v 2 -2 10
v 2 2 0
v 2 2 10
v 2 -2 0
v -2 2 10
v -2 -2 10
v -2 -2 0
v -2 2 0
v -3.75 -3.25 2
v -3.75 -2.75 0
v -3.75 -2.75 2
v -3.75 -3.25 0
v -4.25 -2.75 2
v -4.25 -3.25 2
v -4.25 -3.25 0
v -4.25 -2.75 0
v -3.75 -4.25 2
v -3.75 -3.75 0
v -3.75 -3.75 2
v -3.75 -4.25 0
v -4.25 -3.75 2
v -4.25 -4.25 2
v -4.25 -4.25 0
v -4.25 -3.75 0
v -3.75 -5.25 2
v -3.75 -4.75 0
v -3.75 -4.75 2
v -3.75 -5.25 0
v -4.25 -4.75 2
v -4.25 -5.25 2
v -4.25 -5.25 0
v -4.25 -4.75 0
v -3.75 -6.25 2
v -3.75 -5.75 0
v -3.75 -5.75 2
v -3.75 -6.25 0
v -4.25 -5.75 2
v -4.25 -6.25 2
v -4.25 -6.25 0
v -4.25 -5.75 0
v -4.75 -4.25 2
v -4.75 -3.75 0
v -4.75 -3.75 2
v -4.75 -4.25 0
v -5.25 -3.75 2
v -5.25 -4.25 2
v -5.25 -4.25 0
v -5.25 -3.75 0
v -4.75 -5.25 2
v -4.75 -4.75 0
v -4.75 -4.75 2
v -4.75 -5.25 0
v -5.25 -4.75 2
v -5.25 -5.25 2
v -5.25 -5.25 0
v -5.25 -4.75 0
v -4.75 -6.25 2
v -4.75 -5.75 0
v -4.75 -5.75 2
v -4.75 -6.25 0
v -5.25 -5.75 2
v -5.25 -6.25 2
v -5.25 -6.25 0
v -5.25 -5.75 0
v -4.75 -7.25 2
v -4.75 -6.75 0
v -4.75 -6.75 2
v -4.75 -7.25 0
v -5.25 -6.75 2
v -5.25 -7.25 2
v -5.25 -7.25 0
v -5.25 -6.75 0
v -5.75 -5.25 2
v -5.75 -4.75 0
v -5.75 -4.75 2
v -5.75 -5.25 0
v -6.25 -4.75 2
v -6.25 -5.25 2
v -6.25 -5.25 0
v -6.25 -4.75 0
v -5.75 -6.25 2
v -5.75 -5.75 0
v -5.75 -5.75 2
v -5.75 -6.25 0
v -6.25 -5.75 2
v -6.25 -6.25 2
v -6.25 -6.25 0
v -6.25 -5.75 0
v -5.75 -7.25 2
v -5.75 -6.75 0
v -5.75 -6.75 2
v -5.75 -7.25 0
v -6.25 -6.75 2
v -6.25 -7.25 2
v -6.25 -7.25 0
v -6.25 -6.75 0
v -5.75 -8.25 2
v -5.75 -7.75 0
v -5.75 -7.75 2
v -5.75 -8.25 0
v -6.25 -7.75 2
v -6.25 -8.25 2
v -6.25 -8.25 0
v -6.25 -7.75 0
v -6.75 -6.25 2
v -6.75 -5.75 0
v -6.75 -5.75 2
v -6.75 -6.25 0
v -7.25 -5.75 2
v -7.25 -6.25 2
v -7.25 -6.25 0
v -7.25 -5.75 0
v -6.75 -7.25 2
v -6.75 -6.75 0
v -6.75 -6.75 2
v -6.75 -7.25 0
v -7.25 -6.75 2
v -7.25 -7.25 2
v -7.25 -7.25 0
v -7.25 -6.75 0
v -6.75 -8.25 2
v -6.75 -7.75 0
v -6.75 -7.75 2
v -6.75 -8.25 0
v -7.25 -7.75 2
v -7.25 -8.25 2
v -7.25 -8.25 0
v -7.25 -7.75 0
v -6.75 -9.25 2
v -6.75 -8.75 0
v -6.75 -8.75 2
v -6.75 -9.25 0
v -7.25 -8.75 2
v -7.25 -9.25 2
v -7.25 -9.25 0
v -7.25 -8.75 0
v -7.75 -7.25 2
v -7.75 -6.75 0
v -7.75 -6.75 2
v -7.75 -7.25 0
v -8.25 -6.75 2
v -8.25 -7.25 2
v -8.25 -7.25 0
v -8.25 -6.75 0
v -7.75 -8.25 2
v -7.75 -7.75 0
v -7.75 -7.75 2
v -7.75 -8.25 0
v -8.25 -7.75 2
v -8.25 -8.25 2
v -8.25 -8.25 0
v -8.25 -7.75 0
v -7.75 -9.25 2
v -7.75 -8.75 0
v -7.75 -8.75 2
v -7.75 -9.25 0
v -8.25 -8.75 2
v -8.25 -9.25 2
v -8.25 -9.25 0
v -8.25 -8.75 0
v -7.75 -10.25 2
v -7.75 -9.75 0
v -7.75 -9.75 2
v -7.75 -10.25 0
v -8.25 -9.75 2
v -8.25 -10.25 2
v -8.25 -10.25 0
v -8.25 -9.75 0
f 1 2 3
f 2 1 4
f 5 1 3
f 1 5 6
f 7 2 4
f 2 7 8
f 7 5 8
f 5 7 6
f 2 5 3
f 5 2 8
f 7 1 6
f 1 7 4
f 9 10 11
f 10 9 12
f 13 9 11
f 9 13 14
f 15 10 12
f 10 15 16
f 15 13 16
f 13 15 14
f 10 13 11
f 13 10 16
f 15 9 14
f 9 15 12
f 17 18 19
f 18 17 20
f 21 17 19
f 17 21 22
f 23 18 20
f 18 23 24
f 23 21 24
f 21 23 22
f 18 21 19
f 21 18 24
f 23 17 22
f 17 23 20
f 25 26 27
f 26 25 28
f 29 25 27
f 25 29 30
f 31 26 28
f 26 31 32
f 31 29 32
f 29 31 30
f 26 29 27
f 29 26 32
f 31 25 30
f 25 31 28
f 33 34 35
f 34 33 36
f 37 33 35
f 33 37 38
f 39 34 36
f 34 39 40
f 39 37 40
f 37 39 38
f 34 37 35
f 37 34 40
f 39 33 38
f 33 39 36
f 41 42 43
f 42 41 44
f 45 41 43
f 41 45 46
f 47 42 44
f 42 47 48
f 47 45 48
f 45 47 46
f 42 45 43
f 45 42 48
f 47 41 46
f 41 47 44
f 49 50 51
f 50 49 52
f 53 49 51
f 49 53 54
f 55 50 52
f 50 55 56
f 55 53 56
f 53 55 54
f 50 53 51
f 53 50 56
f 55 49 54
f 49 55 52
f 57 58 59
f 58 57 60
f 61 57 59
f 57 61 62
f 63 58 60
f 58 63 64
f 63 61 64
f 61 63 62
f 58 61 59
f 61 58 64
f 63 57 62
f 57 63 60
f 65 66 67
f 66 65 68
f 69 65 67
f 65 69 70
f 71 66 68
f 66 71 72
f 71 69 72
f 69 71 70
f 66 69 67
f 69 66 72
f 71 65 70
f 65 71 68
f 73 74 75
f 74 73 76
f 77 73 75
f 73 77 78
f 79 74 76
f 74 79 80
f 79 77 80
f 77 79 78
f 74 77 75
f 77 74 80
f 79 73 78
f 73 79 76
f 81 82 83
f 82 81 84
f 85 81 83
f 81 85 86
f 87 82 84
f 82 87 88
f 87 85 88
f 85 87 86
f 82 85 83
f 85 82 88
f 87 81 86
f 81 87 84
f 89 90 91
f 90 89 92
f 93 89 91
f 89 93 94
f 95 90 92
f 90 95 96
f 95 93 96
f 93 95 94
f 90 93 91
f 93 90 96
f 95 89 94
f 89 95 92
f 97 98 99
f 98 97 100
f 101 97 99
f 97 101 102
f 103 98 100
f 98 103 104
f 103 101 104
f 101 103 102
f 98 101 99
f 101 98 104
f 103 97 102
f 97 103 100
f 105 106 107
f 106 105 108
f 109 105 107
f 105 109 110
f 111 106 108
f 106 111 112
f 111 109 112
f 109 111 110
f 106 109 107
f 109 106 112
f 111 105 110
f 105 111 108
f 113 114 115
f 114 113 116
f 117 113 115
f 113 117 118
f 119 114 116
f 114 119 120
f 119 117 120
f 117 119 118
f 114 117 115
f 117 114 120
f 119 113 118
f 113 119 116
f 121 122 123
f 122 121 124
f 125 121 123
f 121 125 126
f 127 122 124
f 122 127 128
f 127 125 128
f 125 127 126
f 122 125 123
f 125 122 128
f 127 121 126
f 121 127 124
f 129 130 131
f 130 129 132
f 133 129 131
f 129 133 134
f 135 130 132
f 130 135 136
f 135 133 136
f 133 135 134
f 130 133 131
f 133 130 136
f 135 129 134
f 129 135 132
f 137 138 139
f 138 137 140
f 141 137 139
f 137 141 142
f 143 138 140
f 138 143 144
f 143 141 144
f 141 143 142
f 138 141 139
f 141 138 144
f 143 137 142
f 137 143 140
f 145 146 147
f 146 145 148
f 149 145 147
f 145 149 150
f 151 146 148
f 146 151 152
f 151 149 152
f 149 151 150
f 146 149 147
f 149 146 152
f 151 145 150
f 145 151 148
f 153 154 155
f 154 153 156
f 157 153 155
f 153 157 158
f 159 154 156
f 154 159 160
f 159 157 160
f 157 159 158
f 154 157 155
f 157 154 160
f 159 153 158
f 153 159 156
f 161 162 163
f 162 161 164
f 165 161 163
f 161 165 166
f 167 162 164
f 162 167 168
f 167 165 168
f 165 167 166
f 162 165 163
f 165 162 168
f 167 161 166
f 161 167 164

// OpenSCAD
translate([0, 0, 5]) color([0,1,0,0.9]) cube([4, 4, 10], center=true);
translate([-4, -3, 1]) color([1,0,0]) cube([0.5, 0.5, 2], center=true);
translate([-4, -4, 1]) color([1,0,0]) cube([0.5, 0.5, 2], center=true);
translate([-4, -5, 1]) color([1,0,0]) cube([0.5, 0.5, 2], center=true);
translate([-4, -6, 1]) color([1,0,0]) cube([0.5, 0.5, 2], center=true);
translate([-5, -4, 1]) color([1,0,0]) cube([0.5, 0.5, 2], center=true);
translate([-5, -5, 1]) color([1,0,0]) cube([0.5, 0.5, 2], center=true);
translate([-5, -6, 1]) color([1,0,0]) cube([0.5, 0.5, 2], center=true);
translate([-5, -7, 1]) color([1,0,0]) cube([0.5, 0.5, 2], center=true);
translate([-6, -5, 1]) color([1,0,0]) cube([0.5, 0.5, 2], center=true);
translate([-6, -6, 1]) color([1,0,0]) cube([0.5, 0.5, 2], center=true);
translate([-6, -7, 1]) color([1,0,0]) cube([0.5, 0.5, 2], center=true);
translate([-6, -8, 1]) color([1,0,0]) cube([0.5, 0.5, 2], center=true);
translate([-7, -6, 1]) color([1,0,0]) cube([0.5, 0.5, 2], center=true);
translate([-7, -7, 1]) color([1,0,0]) cube([0.5, 0.5, 2], center=true);
translate([-7, -8, 1]) color([1,0,0]) cube([0.5, 0.5, 2], center=true);
translate([-7, -9, 1]) color([1,0,0]) cube([0.5, 0.5, 2], center=true);
translate([-8, -7, 1]) color([1,0,0]) cube([0.5, 0.5, 2], center=true);
translate([-8, -8, 1]) color([1,0,0]) cube([0.5, 0.5, 2], center=true);
translate([-8, -9, 1]) color([1,0,0]) cube([0.5, 0.5, 2], center=true);
translate([-8, -10, 1]) color([1,0,0]) cube([0.5, 0.5, 2], center=true);
